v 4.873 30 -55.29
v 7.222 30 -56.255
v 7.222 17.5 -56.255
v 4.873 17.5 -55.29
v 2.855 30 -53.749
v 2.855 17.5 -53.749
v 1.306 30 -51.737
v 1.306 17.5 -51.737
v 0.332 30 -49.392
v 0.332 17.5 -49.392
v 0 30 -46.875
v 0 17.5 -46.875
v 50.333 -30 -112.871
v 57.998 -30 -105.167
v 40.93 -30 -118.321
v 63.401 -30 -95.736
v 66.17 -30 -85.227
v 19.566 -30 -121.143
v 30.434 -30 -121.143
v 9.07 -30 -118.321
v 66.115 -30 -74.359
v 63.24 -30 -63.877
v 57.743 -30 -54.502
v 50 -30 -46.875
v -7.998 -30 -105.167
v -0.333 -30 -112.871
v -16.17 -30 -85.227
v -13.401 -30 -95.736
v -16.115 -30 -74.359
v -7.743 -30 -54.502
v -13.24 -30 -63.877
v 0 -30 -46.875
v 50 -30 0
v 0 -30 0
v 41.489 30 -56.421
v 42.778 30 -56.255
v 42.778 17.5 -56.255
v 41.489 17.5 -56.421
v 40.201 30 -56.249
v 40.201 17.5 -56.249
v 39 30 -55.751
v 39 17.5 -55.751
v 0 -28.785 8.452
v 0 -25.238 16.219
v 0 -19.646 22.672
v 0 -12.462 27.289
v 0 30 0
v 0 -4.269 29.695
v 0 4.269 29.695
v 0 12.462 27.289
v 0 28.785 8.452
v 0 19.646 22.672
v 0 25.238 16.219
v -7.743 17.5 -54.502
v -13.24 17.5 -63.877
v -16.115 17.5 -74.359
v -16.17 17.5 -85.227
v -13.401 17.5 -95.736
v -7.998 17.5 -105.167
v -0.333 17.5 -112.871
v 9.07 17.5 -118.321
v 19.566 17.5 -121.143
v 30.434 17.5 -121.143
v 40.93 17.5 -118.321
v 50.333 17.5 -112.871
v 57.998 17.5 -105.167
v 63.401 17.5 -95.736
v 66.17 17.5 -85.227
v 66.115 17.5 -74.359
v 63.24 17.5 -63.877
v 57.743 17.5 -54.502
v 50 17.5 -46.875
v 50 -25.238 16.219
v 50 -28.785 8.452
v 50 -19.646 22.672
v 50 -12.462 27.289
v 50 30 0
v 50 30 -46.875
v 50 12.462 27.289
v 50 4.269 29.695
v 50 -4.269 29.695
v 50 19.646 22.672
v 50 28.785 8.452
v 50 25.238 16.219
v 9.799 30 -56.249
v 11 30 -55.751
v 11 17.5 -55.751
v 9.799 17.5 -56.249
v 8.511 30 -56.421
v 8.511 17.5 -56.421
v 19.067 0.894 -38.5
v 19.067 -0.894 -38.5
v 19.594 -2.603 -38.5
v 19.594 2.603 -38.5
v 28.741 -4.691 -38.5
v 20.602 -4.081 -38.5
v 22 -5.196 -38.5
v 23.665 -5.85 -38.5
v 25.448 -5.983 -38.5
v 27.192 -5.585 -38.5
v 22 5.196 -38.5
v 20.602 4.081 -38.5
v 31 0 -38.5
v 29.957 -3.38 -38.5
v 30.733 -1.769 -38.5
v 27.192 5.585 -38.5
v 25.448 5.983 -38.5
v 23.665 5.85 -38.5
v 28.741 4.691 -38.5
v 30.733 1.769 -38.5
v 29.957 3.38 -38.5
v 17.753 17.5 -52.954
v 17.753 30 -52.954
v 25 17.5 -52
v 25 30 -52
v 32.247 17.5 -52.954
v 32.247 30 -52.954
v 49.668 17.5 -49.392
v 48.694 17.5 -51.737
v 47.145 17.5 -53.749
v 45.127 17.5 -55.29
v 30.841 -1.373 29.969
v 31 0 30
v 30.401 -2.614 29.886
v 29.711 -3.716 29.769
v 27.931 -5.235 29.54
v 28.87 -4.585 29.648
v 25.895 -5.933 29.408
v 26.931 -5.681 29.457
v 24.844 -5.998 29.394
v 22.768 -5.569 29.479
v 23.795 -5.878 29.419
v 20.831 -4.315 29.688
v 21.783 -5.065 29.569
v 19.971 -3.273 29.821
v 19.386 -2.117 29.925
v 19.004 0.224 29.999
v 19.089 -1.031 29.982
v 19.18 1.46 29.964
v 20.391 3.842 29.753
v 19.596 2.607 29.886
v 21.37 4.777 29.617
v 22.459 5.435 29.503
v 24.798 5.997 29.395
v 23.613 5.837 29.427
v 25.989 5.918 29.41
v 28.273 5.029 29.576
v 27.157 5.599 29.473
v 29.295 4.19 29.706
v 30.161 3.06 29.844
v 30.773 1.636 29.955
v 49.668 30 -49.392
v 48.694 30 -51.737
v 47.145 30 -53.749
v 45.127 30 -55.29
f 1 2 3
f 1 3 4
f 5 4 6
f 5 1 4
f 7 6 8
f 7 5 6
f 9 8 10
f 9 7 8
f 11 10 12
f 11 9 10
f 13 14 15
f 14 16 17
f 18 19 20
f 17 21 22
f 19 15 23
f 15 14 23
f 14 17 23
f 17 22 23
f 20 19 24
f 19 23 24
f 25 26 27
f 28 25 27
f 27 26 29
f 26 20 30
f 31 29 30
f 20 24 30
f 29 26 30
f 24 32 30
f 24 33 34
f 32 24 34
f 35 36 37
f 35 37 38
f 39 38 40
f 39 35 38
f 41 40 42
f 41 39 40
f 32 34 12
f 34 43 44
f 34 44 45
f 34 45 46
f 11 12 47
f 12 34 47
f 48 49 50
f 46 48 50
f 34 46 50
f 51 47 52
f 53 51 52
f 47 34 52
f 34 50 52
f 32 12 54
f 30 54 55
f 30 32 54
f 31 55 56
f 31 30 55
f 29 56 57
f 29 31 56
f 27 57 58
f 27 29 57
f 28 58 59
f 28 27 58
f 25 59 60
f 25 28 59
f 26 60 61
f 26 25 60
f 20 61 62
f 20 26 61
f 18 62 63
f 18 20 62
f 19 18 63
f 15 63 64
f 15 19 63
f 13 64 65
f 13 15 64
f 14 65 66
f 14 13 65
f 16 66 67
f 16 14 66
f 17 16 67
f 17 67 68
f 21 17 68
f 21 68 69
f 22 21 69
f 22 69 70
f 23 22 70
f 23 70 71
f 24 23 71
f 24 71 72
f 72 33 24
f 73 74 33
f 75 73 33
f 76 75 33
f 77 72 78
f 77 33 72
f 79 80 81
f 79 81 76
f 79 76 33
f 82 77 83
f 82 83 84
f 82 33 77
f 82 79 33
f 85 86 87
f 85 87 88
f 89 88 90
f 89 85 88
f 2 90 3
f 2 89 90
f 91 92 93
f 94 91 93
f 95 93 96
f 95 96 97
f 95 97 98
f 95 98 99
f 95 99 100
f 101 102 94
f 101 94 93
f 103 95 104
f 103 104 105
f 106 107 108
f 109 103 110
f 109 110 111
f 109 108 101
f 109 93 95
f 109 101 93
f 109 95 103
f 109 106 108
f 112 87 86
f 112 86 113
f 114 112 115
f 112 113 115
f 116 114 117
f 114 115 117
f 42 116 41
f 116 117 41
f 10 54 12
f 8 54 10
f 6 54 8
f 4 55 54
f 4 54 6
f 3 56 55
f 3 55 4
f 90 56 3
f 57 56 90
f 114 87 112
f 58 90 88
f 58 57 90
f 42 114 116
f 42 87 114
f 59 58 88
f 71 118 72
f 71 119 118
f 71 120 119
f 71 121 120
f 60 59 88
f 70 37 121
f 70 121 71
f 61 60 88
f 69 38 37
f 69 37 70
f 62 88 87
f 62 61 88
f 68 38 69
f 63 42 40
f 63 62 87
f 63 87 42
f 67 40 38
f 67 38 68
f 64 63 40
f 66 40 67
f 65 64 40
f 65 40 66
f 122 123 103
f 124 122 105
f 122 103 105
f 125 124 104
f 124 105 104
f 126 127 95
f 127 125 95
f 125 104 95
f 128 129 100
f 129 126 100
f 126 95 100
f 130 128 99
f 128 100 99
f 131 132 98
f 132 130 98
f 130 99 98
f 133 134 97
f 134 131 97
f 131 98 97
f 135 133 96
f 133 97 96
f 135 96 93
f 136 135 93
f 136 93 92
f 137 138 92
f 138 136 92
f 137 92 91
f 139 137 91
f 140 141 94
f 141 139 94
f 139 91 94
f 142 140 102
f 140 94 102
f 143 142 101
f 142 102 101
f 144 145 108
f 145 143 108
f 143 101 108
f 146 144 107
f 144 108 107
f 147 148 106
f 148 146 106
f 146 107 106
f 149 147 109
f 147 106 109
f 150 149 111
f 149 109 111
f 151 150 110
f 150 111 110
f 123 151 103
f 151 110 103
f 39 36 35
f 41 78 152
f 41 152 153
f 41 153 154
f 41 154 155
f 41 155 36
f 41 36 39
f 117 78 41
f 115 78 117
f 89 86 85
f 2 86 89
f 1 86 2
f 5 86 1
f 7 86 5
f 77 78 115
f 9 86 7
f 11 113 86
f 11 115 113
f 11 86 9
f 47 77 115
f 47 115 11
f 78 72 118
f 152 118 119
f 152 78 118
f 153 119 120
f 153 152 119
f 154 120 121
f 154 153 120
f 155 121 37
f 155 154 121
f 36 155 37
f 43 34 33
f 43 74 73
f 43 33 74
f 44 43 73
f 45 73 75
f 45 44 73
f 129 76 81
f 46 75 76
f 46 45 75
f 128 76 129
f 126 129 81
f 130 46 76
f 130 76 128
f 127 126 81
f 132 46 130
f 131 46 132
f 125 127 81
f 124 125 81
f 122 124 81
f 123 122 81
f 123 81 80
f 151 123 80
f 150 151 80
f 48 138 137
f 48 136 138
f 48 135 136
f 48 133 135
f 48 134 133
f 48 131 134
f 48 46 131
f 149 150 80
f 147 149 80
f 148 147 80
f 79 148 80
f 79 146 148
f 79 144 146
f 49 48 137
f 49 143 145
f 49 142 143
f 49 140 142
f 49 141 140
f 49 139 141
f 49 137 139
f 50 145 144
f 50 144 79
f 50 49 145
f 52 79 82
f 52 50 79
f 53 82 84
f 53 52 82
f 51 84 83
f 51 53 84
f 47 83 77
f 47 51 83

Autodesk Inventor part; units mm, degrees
ref_plane "YZ Plane" through (0, 0, 0) normal (1, 0, 0) x (0, 1, 0)
ref_plane "XZ Plane" through (0, 0, 0) normal (0, 1, 0) x (-1, 0, 0)
sketch "Sketch1" plane through (0, 0, 0) normal (0, 1, 0) x (-1, 0, 0)
  line L0 (0, 0) -> (-50, 0)
  line L1 (-50, 0) -> (-50, -80)
  line L2 (-50, -80) -> (0, -80)
  line L3 (0, -80) -> (0, 0)
  circle A0 centre (-25, -80) radius 41.5
  point P0 (-50, -46.8752)
  point P1 (0, -46.8752)
  dimension "d0" = 50
  dimension "d1" = 83
  dimension "d14" = 80
extrude "Extrusion1" add sketch "Sketch1" along normal mid plane 60
sketch "Sketch2" plane through (0, 0, 0) normal (1, 0, 0) x (0, 1, 0)
  line L0 (30, 0) -> (-30, 0) projected
  circle A0 centre (0, 0) radius 30
extrude "Extrusion2" add sketch "Sketch2" along normal up to surface (50 mm away) contours L0 A0 picked at (-5.2341, 20.5501)
sketch "Sketch3" plane through (0, 30, 0) normal (0, 1, 0) x (1, 0, 0)
  arc A0 (50, 46.8752) -> (0, 46.8752) centre (25, 80) ccw projected
  circle A1 centre (25, 80) radius 41.5
  circle A2 centre (25, 80) radius 28
  line L0 (0, -30) -> (50, -30) construction
  line L1 (25, 80) -> (44.9219, 52.757) construction
  line L2 (8.1861, 50.8774) -> (25, 80) construction
  line L3 (50, 46.8752) -> (50, 47.5169)
  line L4 (0, 46.8752) -> (0, 0) projected
  line L5 (0, 46.8752) -> (0, 46.5678)
  circle A3 centre (25, 80) radius 33 construction
  line L6 (25, 80) -> (25, -30) construction
  line L7 (0, -30) -> (50, -30) construction
  arc A4 (11, 55.7513) -> (7.2217, 56.255) centre (8.5, 51.4212) ccw
  arc A5 (7.2217, 56.255) -> (0, 46.8752) centre (9.7022, 46.8752) ccw
  arc A6 (42.7783, 56.255) -> (39, 55.7513) centre (41.5, 51.4212) ccw
  arc A7 (50, 46.8752) -> (42.7783, 56.255) centre (40.2978, 46.8752) ccw
  point P0 (0, 46.8752)
  point P1 (66.5, 80)
  dimension "d15" = 56
  dimension "d22" = 66
  dimension "d23" = 30
extrude "Extrusion3" cut sketch "Sketch3" against normal blind 12.5 contours A7 A6 A2 A4 A5 A0 | A2
ref_plane "Work Plane1" through (25, 0, -38.5) normal (0, 0, 1) x (1, 0, 0)
sketch "Sketch4" plane through (25, 0, -38.5) normal (0, 0, 1) x (1, 0, 0)
  circle A0 centre (0, 0) radius 6
  line L0 (-14, 30) -> (14, 30) construction
  line L1 (0, 30) -> (0, -30) construction
  line L2 (-41.5, -30) -> (41.5, -30) construction
  line L3 (-25, 0) -> (25, 0) construction
  line L4 (25, -30) -> (25, 30) construction
  point P0 (-25, -30)
  point P1 (20.75, 17.5)
  point P2 (0, 0)
  dimension "d19" = 12
extrude "Extrusion4" cut sketch "Sketch4" along normal through all
properties part number "thigh_inventor"
